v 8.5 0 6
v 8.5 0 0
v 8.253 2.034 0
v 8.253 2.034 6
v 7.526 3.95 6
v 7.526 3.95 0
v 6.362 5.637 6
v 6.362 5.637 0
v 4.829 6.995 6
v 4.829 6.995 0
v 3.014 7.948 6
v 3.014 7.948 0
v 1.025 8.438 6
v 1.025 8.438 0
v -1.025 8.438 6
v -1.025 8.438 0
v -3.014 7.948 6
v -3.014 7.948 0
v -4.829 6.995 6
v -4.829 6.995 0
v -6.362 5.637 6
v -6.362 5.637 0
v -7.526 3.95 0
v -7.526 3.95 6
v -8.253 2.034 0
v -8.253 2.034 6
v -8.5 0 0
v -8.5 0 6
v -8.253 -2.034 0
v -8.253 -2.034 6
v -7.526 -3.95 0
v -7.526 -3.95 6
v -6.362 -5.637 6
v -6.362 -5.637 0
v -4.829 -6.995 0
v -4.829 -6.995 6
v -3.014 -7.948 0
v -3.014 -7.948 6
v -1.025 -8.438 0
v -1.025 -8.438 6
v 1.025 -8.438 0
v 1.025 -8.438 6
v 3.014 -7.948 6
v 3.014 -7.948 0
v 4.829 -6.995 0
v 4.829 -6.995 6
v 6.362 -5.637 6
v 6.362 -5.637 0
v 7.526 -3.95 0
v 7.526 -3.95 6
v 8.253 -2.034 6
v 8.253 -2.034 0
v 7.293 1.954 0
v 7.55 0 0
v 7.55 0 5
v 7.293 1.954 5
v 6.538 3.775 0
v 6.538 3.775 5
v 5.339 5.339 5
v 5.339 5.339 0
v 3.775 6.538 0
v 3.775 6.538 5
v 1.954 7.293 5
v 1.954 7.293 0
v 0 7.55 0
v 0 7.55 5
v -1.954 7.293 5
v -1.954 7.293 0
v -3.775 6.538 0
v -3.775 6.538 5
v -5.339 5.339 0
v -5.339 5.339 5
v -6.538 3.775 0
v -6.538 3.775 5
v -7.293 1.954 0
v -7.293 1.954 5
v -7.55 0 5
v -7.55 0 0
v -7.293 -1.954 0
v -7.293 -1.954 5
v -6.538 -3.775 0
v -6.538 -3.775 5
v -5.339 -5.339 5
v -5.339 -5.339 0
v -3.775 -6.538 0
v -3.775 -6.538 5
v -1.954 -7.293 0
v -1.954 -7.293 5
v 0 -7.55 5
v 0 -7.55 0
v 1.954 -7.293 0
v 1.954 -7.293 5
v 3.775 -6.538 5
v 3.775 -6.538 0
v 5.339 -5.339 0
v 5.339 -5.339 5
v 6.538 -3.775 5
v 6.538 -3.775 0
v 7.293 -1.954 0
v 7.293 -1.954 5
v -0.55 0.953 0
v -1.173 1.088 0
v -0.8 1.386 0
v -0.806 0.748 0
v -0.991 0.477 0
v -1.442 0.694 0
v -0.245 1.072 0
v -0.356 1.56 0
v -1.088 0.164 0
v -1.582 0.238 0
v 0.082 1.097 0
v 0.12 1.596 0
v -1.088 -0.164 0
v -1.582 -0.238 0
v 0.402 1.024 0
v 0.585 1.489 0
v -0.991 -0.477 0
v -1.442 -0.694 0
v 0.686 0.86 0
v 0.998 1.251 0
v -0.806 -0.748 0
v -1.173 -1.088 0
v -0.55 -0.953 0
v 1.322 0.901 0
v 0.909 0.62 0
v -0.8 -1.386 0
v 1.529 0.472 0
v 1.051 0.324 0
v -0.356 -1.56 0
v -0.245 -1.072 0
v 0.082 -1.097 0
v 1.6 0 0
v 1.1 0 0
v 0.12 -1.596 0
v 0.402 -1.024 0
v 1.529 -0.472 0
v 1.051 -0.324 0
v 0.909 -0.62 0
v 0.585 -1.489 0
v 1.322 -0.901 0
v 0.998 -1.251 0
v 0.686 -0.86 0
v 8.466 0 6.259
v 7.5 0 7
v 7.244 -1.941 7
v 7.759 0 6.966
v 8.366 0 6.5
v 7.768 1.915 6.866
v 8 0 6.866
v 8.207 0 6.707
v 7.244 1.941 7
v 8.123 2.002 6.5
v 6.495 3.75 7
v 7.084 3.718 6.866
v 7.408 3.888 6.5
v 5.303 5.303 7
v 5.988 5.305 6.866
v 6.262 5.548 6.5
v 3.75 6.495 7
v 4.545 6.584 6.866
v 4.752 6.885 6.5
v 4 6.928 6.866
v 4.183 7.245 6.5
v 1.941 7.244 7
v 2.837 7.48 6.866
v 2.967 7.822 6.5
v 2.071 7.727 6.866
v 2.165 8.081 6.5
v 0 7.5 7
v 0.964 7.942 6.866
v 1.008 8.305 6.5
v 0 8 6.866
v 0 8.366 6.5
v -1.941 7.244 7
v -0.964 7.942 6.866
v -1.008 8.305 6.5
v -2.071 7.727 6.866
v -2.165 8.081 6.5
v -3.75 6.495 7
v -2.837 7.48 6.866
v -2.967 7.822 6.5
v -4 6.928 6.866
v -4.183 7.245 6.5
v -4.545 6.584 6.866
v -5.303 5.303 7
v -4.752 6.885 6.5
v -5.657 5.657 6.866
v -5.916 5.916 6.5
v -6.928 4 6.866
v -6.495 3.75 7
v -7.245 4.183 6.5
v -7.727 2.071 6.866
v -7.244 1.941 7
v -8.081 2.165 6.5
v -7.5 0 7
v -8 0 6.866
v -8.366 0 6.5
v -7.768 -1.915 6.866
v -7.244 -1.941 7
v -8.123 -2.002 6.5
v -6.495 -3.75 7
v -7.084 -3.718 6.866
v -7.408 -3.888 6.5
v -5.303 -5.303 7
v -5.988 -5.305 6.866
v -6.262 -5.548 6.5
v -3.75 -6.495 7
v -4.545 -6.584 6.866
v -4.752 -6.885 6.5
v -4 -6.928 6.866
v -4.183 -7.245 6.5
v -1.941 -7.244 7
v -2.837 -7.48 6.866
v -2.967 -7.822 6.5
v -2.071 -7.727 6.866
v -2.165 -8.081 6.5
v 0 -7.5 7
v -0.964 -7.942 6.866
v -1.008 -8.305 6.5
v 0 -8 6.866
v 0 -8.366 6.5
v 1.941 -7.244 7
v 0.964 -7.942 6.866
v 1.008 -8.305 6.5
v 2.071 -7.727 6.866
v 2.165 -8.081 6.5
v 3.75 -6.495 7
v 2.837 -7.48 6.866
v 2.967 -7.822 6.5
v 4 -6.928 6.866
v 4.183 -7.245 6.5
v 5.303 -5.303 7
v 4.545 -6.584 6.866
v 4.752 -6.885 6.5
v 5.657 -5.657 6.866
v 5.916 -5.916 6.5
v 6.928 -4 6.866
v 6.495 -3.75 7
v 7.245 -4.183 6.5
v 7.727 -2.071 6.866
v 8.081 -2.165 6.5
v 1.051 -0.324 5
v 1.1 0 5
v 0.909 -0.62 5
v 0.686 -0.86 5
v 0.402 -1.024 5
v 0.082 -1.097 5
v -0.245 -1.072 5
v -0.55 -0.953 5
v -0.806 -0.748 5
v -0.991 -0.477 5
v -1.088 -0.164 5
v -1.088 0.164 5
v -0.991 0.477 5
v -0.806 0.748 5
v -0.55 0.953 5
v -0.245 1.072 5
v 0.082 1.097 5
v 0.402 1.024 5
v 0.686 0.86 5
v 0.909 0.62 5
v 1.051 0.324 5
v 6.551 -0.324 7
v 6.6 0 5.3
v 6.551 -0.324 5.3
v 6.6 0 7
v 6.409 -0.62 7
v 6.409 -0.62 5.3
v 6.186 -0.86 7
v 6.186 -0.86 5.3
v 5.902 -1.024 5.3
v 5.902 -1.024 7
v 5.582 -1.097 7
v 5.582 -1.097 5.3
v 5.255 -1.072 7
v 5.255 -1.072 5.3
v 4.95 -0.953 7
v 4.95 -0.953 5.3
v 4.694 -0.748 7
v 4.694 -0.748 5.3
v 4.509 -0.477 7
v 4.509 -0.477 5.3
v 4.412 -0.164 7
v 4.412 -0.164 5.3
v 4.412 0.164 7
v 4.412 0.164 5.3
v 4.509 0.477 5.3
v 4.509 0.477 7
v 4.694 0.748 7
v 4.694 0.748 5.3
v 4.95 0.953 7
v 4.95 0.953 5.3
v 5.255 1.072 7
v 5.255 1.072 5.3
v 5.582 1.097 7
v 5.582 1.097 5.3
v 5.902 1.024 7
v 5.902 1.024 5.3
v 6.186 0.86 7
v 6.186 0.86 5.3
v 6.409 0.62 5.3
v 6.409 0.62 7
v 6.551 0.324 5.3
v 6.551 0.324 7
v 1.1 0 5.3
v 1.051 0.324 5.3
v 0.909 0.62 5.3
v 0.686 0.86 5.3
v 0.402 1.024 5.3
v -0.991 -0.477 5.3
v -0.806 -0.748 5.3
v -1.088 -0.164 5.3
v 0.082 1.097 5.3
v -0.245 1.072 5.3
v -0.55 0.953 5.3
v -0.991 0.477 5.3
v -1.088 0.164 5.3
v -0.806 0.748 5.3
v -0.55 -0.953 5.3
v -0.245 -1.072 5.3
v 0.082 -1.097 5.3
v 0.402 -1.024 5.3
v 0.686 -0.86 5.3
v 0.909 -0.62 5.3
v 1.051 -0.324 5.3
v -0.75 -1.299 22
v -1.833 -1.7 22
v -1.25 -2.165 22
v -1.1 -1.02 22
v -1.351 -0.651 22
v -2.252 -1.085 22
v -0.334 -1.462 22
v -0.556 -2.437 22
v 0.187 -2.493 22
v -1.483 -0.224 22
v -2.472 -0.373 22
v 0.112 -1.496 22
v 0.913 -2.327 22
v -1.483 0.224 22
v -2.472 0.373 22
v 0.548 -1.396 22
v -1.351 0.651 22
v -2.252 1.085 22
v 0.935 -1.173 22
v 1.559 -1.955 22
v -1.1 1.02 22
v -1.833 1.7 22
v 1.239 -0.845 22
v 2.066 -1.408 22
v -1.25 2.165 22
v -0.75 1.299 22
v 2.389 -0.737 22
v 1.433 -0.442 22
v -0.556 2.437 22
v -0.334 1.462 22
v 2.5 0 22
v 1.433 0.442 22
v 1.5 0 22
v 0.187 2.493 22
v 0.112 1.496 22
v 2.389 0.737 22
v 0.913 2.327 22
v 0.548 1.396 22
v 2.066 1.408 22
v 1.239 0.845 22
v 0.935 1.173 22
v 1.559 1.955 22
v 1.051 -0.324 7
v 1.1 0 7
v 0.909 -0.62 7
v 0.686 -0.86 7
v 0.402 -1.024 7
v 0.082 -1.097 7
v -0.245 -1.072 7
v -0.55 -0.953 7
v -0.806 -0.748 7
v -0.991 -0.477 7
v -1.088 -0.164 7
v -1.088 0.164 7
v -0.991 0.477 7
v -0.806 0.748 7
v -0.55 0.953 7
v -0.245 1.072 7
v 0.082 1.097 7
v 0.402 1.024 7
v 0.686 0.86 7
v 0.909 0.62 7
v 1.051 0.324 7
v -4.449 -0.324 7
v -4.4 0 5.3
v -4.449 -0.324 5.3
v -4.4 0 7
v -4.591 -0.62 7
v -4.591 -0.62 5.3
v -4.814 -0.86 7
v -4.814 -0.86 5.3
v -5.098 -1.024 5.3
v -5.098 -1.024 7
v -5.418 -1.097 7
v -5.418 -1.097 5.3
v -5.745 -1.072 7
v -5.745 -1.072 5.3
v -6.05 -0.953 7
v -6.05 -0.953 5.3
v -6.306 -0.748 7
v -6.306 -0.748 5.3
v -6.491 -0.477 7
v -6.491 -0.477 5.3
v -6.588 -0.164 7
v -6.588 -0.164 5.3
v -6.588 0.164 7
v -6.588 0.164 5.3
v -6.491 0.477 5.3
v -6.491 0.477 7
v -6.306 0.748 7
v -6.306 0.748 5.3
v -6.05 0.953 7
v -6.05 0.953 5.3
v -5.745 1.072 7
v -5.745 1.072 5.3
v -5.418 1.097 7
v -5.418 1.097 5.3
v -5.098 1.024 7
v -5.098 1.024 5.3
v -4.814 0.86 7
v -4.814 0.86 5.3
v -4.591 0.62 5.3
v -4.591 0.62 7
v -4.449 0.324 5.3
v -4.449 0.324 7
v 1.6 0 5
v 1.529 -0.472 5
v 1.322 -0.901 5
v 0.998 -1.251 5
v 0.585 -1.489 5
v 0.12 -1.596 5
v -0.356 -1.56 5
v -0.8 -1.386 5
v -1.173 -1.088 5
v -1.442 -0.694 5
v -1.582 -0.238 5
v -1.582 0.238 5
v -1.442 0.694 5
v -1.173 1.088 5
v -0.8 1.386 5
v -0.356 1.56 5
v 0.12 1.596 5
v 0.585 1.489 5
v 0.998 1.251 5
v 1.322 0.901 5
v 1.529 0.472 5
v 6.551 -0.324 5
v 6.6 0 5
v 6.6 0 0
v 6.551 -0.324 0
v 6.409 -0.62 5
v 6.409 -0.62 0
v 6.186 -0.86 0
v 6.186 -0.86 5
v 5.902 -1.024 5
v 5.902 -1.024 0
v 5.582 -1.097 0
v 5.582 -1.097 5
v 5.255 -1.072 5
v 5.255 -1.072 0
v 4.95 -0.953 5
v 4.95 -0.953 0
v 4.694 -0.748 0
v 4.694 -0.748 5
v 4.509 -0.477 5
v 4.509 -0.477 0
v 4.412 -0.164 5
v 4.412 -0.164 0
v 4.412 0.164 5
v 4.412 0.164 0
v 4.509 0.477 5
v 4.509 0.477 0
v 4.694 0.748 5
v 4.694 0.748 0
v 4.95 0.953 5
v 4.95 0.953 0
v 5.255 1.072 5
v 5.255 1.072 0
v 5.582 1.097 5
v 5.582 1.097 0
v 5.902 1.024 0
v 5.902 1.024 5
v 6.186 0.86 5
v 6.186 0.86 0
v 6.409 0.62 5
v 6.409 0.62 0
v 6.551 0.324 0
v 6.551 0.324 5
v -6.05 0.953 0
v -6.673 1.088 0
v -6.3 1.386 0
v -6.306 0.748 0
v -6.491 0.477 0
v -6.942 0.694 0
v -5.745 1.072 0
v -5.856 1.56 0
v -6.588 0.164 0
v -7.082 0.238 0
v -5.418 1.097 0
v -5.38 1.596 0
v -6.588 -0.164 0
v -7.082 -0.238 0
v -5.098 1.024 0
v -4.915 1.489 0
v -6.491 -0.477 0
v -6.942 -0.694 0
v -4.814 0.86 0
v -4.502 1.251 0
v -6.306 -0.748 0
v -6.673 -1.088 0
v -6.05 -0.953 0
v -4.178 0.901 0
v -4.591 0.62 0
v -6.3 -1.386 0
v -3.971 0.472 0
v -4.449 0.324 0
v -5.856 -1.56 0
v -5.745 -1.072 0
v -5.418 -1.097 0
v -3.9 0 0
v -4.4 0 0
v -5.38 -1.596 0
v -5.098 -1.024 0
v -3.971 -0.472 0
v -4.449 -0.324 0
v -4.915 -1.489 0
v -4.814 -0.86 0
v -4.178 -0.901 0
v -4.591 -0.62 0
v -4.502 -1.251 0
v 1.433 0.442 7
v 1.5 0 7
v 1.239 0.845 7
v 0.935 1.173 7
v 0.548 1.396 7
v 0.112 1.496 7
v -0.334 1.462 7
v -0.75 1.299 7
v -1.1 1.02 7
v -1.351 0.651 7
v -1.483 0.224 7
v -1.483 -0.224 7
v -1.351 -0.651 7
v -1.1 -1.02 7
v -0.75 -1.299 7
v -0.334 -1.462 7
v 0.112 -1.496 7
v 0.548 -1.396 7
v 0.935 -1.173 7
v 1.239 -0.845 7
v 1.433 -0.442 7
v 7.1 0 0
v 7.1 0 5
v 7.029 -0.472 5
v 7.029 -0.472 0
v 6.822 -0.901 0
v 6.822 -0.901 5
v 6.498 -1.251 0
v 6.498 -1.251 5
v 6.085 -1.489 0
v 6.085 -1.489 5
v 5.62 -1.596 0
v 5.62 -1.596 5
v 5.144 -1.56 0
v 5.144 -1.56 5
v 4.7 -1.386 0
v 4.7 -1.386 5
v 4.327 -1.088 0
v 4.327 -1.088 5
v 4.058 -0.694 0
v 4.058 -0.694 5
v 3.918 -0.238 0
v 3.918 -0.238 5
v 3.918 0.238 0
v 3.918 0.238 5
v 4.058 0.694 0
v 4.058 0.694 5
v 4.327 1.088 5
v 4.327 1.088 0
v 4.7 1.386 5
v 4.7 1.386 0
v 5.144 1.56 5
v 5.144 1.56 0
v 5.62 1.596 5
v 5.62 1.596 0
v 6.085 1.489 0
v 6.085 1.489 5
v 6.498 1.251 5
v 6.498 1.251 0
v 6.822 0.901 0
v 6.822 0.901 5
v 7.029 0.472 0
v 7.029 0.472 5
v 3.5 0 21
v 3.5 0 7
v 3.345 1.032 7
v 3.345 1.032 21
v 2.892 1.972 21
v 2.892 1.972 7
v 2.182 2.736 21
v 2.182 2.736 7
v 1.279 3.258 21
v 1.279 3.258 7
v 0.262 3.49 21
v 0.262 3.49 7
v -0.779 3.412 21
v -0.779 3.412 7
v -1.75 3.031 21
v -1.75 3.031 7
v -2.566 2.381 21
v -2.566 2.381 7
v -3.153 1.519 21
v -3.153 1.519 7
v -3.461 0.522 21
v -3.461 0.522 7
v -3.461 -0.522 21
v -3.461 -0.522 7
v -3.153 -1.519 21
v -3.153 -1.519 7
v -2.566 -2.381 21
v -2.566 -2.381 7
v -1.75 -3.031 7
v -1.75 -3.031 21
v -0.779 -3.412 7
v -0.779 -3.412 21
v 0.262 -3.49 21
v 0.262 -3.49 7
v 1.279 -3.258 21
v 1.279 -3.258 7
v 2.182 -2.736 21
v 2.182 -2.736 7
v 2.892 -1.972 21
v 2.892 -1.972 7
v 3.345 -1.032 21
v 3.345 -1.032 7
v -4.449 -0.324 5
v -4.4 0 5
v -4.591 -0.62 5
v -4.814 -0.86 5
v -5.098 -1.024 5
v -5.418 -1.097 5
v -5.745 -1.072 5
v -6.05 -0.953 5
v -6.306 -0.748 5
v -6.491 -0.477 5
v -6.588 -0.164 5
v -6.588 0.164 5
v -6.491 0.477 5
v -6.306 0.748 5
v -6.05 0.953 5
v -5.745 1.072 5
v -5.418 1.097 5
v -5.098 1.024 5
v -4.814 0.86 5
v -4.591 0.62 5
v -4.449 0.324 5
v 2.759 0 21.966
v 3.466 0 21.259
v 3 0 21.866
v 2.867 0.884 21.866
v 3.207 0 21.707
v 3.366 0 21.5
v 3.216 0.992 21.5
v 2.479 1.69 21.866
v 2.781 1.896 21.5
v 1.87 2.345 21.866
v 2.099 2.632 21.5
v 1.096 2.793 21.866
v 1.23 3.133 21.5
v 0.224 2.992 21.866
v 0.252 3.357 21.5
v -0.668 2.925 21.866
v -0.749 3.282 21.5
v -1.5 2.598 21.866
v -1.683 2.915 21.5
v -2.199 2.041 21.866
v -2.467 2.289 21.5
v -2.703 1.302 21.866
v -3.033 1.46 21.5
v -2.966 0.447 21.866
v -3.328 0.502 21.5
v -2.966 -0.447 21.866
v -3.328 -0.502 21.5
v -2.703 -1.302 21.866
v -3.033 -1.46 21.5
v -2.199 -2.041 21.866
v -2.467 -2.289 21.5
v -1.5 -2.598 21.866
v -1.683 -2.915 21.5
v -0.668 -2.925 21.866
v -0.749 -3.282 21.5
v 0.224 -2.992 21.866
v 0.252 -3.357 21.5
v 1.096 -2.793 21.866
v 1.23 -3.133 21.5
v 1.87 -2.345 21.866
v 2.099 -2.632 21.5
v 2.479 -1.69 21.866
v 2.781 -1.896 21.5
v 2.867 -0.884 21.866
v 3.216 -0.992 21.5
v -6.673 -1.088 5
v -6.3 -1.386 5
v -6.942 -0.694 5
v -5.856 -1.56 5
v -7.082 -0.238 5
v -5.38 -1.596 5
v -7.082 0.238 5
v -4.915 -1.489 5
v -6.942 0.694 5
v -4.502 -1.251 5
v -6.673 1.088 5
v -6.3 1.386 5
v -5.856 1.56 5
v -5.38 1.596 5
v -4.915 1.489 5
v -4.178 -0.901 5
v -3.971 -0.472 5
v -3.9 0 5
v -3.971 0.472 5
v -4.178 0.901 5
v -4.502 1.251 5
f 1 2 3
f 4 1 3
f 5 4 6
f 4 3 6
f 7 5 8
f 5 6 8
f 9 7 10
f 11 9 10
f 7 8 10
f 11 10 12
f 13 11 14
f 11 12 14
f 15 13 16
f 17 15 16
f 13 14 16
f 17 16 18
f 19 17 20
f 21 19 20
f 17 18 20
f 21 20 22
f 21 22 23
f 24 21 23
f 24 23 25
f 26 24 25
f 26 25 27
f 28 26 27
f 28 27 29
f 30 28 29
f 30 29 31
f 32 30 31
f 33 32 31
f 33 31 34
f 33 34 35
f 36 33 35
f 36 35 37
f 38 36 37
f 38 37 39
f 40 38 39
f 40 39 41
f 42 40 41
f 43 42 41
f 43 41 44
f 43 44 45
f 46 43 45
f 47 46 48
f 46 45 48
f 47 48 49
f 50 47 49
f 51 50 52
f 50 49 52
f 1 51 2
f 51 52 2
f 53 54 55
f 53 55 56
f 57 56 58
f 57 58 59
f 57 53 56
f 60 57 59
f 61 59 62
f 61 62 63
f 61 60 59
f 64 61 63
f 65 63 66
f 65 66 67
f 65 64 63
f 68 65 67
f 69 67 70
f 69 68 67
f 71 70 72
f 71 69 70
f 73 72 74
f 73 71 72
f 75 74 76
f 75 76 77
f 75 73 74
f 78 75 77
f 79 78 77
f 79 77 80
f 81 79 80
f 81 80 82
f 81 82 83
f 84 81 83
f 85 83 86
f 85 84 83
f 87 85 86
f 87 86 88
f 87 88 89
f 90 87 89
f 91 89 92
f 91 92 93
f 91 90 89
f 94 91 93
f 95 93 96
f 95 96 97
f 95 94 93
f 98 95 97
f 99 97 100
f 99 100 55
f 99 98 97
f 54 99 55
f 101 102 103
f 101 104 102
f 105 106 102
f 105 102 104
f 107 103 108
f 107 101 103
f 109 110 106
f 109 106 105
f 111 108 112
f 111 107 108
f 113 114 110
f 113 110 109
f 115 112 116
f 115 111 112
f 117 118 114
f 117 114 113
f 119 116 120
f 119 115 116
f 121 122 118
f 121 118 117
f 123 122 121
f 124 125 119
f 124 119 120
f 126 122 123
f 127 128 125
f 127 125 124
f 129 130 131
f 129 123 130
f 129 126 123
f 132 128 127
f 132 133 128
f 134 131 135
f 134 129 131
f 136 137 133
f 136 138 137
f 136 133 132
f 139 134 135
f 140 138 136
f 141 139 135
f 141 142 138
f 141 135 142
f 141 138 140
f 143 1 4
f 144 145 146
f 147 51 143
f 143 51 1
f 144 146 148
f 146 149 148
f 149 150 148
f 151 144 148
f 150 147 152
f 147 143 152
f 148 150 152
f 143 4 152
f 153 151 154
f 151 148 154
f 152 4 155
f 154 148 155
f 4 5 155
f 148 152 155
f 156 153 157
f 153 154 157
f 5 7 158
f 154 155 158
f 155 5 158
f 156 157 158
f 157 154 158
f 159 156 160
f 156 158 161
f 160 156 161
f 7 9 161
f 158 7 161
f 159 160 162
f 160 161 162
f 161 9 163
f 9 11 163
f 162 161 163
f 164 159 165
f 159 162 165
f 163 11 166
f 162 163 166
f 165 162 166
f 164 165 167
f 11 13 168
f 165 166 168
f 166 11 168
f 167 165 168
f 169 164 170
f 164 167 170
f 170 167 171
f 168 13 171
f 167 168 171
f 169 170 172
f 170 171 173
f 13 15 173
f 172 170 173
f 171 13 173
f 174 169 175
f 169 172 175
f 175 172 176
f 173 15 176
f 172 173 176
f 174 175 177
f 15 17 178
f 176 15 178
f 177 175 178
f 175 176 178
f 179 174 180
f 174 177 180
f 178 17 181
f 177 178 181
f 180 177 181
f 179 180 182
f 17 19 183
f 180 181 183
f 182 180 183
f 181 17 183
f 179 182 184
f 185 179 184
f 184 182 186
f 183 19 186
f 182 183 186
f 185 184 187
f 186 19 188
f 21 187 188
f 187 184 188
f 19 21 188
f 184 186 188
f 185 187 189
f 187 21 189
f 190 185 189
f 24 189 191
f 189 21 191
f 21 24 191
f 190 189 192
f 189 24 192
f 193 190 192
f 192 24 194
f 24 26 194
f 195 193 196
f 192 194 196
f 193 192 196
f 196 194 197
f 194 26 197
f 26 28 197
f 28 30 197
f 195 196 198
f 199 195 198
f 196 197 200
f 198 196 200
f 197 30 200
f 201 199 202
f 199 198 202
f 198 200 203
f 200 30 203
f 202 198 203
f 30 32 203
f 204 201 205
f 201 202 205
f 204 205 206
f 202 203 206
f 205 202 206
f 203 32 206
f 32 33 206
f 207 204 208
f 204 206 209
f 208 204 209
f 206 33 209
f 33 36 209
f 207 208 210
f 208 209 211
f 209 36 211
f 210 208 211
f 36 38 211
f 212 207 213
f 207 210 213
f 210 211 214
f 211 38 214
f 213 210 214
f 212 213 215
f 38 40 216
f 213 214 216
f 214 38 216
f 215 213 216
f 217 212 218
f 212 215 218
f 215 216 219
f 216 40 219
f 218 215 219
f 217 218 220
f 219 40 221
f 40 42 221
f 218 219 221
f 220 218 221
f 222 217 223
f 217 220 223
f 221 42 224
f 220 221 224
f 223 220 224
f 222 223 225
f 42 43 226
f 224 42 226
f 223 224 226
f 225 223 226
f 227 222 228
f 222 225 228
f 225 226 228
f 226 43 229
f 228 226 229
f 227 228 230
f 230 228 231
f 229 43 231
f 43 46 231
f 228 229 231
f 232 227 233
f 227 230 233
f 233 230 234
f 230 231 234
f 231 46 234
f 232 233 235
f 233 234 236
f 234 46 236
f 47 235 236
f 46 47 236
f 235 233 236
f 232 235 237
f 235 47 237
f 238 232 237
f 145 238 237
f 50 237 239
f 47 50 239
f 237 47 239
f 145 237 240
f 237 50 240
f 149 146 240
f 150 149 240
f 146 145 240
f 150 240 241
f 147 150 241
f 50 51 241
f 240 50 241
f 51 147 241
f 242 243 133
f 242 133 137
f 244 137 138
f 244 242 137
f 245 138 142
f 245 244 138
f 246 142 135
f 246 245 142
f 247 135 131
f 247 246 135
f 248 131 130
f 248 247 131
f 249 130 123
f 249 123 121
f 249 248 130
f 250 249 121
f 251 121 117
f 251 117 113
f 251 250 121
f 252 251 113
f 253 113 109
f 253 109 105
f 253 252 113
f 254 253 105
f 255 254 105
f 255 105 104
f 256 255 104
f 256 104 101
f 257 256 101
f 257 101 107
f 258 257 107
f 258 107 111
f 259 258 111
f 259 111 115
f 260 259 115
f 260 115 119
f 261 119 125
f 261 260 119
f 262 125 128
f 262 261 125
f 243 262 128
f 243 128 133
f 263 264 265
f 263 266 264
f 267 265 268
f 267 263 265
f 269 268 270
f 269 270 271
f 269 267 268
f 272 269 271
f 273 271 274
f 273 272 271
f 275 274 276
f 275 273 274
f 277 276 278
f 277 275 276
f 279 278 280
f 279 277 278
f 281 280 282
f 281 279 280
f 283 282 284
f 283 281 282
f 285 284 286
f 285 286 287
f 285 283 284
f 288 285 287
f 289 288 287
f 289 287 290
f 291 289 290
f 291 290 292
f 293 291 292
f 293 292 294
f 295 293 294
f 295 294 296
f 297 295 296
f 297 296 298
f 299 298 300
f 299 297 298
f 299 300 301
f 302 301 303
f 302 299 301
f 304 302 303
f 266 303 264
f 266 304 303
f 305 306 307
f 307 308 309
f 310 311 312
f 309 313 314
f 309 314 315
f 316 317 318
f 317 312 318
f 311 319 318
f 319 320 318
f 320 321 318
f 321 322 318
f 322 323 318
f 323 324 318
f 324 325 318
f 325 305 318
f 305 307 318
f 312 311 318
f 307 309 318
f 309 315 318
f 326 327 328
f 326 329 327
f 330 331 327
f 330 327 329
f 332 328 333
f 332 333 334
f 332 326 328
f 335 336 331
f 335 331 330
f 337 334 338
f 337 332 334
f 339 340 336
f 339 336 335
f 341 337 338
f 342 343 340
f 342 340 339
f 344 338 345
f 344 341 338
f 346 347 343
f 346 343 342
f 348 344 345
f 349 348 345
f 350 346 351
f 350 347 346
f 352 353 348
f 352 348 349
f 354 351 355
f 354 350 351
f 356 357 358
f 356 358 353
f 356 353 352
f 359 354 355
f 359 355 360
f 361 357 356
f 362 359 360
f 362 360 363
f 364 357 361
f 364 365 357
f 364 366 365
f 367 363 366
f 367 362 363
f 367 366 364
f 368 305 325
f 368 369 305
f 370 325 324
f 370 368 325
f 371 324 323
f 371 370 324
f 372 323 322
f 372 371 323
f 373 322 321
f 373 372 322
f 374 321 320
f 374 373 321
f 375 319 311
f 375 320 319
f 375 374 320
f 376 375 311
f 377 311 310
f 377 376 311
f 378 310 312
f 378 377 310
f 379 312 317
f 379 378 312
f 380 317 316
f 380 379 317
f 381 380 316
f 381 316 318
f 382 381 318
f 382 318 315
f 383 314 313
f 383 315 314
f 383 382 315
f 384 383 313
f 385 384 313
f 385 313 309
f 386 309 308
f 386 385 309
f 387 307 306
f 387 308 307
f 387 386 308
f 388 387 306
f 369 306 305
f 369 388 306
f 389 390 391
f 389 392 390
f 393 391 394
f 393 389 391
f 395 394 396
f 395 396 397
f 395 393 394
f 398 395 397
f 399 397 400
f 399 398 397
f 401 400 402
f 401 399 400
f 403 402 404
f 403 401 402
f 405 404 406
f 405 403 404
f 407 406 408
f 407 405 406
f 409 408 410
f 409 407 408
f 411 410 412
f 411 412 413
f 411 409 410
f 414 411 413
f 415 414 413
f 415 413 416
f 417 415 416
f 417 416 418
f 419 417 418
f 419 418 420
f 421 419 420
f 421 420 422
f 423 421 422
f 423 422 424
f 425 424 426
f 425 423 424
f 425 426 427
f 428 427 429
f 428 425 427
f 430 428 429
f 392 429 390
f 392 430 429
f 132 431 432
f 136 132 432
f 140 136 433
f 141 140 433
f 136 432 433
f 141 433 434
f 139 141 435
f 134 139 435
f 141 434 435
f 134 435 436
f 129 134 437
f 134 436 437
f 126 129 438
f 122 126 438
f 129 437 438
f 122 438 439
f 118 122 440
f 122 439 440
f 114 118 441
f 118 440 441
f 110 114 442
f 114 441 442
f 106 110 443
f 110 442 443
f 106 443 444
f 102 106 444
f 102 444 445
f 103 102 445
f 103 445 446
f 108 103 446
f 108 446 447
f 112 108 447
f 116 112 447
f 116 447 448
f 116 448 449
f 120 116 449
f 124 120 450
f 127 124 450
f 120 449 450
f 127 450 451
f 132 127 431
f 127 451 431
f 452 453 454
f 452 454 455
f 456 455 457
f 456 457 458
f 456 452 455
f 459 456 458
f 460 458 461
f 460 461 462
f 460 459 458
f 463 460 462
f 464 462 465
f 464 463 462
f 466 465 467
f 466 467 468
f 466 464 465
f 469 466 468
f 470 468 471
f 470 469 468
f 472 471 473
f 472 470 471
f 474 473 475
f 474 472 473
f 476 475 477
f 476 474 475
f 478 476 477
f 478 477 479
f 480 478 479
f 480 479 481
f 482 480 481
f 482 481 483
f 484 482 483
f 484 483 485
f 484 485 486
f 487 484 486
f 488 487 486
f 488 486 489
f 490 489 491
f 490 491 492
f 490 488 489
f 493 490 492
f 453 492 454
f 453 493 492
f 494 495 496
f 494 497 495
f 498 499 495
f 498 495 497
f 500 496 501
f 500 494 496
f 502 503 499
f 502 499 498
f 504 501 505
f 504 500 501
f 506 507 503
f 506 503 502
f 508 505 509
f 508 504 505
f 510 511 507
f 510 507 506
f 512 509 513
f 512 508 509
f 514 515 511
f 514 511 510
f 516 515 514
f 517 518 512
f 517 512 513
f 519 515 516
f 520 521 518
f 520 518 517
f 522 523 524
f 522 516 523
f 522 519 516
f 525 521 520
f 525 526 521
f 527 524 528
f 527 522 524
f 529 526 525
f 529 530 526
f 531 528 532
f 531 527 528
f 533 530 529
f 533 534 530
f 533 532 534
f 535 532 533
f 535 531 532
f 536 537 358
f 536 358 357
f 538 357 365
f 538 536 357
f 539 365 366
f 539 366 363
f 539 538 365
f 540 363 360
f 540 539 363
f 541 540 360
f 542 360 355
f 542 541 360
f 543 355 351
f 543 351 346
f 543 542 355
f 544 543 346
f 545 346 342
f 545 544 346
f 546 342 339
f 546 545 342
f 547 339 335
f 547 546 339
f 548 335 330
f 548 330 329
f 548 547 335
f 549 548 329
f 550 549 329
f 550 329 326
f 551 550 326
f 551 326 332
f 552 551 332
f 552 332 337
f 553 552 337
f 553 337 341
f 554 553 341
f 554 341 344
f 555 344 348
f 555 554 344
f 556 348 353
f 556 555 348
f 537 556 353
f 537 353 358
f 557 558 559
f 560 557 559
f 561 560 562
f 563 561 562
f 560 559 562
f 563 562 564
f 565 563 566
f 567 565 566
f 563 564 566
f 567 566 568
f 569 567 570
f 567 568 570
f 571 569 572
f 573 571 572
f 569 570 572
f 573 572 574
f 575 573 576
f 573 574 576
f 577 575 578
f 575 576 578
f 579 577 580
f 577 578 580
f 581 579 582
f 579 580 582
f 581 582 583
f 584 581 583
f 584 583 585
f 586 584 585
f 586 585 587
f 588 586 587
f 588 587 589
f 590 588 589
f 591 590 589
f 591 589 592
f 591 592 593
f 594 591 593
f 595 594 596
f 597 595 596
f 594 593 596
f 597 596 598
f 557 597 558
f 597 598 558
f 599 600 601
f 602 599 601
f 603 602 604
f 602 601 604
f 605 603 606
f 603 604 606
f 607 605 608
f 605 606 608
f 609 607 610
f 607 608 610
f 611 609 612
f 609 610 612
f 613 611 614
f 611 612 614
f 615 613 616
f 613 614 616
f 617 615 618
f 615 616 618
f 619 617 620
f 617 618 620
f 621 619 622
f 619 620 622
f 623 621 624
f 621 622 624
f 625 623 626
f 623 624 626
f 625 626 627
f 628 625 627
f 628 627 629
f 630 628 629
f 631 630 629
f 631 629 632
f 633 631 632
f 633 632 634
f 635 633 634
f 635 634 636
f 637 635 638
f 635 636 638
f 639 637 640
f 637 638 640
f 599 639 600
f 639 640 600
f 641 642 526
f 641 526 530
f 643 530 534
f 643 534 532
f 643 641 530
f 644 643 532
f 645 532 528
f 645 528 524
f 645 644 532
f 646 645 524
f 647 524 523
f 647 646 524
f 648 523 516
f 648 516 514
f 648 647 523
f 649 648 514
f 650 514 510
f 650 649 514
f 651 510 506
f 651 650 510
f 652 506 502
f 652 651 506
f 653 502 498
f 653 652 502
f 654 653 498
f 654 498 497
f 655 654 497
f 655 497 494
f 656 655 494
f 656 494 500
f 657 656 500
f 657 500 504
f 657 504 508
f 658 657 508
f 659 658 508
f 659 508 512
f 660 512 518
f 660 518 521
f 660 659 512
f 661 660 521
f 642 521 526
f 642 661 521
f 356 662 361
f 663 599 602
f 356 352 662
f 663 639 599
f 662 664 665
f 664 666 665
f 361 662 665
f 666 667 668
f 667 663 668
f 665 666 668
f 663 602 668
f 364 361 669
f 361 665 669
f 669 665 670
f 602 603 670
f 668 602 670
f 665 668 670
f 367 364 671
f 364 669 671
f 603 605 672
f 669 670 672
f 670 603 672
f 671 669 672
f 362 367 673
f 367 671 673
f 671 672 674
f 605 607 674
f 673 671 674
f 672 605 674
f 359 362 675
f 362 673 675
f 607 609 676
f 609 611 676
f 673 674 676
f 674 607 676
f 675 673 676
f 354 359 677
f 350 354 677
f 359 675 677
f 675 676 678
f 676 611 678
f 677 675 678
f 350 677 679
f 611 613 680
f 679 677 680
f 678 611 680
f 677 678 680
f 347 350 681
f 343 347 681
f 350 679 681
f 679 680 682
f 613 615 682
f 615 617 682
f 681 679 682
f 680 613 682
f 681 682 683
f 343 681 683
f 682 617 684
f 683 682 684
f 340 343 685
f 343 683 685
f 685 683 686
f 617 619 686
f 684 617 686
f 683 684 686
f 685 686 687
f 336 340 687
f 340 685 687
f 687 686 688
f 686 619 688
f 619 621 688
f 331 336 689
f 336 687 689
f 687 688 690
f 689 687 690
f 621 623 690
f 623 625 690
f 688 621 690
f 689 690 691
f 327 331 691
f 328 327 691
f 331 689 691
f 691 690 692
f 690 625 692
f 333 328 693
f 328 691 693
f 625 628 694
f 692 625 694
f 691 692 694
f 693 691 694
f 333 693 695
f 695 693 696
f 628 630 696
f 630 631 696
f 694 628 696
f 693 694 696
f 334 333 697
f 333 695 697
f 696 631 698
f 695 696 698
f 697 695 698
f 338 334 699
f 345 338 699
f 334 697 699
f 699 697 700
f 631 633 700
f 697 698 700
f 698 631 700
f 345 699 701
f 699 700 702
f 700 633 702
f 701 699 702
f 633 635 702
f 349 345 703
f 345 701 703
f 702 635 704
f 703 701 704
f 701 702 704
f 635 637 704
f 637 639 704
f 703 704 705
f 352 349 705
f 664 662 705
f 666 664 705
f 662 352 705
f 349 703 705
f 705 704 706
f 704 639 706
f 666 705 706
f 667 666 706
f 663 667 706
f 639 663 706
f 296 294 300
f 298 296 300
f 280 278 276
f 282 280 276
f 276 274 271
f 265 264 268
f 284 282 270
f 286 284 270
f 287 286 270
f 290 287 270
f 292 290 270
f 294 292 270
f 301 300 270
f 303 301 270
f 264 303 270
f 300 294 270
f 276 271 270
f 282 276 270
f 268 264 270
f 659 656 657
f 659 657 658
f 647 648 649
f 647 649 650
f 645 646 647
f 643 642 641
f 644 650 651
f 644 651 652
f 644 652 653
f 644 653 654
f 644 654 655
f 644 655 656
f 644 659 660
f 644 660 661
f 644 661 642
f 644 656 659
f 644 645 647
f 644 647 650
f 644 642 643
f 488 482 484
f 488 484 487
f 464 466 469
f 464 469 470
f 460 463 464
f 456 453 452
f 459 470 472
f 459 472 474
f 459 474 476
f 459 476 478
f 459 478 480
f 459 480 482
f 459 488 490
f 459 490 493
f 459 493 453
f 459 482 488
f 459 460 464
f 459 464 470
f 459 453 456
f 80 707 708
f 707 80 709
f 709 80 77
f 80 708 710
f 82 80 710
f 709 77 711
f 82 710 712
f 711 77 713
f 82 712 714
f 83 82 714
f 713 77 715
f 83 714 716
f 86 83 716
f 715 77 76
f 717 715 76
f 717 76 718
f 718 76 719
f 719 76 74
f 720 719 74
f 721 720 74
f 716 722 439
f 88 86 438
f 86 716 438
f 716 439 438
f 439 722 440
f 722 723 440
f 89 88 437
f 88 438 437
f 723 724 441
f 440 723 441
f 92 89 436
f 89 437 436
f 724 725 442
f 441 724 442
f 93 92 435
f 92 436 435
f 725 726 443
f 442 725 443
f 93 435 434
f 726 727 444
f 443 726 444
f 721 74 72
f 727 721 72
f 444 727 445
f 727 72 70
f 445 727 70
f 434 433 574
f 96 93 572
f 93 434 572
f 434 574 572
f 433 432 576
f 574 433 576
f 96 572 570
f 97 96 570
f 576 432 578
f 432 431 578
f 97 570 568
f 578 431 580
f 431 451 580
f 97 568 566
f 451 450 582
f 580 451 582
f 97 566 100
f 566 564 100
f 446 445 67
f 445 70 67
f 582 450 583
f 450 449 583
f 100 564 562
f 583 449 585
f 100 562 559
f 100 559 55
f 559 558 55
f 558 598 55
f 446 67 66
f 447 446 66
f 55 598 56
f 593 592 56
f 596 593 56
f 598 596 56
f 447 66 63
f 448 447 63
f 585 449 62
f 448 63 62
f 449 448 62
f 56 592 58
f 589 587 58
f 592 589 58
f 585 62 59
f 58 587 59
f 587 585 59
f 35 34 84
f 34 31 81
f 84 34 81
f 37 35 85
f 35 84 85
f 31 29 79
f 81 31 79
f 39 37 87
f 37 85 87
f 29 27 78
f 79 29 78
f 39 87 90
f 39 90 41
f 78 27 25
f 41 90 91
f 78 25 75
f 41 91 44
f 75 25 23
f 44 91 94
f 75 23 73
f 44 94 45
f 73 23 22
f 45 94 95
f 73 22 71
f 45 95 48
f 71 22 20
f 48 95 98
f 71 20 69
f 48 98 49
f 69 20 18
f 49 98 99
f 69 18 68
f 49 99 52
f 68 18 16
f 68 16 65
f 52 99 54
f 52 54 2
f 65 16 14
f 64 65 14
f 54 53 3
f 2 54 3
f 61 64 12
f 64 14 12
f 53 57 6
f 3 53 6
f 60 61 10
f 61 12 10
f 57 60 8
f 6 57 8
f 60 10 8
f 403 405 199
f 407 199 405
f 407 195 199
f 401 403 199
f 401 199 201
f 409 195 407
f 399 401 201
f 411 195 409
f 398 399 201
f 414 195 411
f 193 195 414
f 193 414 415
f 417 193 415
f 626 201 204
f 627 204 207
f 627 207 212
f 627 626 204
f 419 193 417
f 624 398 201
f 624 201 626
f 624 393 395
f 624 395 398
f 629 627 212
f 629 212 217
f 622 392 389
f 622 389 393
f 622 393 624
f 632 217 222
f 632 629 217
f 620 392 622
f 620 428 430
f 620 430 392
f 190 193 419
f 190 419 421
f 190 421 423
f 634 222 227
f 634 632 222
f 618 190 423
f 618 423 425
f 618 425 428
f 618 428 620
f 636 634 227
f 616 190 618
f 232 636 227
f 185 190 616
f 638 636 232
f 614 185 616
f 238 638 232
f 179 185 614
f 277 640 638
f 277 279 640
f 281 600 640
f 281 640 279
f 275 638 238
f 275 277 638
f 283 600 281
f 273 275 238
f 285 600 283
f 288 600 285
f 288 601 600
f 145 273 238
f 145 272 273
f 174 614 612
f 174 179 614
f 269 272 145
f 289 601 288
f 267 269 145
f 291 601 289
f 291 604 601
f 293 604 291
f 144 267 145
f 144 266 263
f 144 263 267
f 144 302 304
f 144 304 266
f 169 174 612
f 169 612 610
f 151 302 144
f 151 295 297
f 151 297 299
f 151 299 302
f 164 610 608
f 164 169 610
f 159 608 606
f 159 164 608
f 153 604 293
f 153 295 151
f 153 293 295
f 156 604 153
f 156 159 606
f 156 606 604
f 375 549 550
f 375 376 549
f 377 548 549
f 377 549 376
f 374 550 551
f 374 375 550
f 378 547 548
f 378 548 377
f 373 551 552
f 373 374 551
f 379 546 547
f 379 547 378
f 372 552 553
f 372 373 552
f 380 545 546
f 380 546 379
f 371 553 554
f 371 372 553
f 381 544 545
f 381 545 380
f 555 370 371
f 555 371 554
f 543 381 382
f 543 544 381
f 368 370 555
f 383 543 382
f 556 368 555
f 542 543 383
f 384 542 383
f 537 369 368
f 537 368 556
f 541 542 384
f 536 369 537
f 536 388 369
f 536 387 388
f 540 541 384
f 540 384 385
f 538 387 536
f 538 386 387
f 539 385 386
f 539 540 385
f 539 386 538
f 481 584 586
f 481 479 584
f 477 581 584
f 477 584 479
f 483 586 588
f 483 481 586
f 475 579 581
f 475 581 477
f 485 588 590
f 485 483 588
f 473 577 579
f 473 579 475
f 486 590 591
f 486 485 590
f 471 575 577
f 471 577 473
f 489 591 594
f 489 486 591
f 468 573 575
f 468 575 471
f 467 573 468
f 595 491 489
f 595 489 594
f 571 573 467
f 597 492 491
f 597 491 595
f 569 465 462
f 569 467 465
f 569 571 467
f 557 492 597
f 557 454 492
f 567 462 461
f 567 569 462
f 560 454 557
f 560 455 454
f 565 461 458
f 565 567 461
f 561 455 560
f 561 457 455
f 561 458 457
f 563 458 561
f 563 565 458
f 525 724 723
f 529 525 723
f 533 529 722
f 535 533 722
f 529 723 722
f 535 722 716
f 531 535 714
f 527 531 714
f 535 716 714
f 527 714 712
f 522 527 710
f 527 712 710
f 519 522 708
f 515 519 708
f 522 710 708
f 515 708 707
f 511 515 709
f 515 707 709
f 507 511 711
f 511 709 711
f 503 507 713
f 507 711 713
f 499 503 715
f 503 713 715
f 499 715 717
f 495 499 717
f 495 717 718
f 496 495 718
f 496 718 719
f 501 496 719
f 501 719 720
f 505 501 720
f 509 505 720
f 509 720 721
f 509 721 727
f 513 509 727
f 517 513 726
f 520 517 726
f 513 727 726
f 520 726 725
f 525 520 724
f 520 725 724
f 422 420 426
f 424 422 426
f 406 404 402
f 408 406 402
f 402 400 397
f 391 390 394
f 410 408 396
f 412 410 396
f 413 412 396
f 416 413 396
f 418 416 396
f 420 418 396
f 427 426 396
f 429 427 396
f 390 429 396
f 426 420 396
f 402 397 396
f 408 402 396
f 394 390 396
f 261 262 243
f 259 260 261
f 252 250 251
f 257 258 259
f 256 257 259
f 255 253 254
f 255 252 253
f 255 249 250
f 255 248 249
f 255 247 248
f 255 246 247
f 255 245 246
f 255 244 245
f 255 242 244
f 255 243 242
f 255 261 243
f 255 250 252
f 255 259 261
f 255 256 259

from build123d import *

# Parameters (mm, degrees)
SKETCH1_R               = 8.5
SKETCH1_R_2             = 7.55
BOSS_EXTRUDE1_DEPTH     = 5
SKETCH2_R               = 8.5
SKETCH2_R_2             = 1.1
BOSS_EXTRUDE2_DEPTH     = 2
SKETCH3_R               = 3.5
SKETCH3_R_2             = 1.5
BOSS_EXTRUDE3_DEPTH     = 15
CUT_EXTRUDE1_DEPTH      = 20.222382787
CUT_EXTRUDE1_DEPTH_BACK = 20.222382787
SKETCH3_3_R             = 1.1
SKETCH4_R               = 1.6
SKETCH4_R_2             = 1.1
BOSS_EXTRUDE4_DEPTH     = 5
BOSS_EXTRUDE5_START     = -0.3
SKETCH5_R               = 1.1
BOSS_EXTRUDE5_DEPTH     = 0.3
FILLET1_R               = 1


with BuildPart() as part:
    # Sketch1 → Boss-Extrude1 (new body)
    with BuildSketch(Plane.XY):
        Circle(SKETCH1_R)
        Circle(SKETCH1_R_2, mode=Mode.SUBTRACT)
    extrude(amount=BOSS_EXTRUDE1_DEPTH)

    # Sketch2 → Boss-Extrude2 (add)
    with BuildSketch(Plane.XY.offset(5)):
        Circle(SKETCH2_R)
        Circle(SKETCH2_R_2, mode=Mode.SUBTRACT)
    extrude(amount=BOSS_EXTRUDE2_DEPTH)

    # Sketch3 → Boss-Extrude3 (add)
    with BuildSketch(Plane.XY.offset(7)):
        Circle(SKETCH3_R)
        Circle(SKETCH3_R_2, mode=Mode.SUBTRACT)
    extrude(amount=BOSS_EXTRUDE3_DEPTH)

    # Sketch3<3> → Cut-Extrude1 (cut, two sides: drawn at the far end of the back side and taken through both)
    with BuildSketch(Plane.XY.offset(7).offset(-CUT_EXTRUDE1_DEPTH_BACK)):
        with Locations((-5.5, 0)):
            Circle(SKETCH3_3_R)
        with Locations((5.5, 0)):
            Circle(SKETCH3_3_R)
    extrude(amount=CUT_EXTRUDE1_DEPTH + CUT_EXTRUDE1_DEPTH_BACK, mode=Mode.SUBTRACT)

    # Sketch4 → Boss-Extrude4 (add)
    # profile 1 of 3: a face of its own
    with BuildSketch(Plane(origin=(0, 0, 5), x_dir=(-1, 0, 0), z_dir=(0, 0, -1))):
        with Locations(Location((5.5, 0, 0), (0, 0, 180))):
            Circle(SKETCH4_R)
        with Locations(Location((5.5, 0, 0), (0, 0, 180))):
            Circle(SKETCH4_R_2, mode=Mode.SUBTRACT)
    # profile 2 of 3: a face of its own
    with BuildSketch(Plane(origin=(0, 0, 5), x_dir=(-1, 0, 0), z_dir=(0, 0, -1))):
        with Locations(Location((0, 0, 0), (0, 0, 180))):
            Circle(SKETCH4_R)
        with Locations(Location((0, 0, 0), (0, 0, 180))):
            Circle(SKETCH4_R_2, mode=Mode.SUBTRACT)
    # profile 3 of 3: a face of its own
    with BuildSketch(Plane(origin=(0, 0, 5), x_dir=(-1, 0, 0), z_dir=(0, 0, -1))):
        with Locations(Location((-5.5, 0, 0), (0, 0, 180))):
            Circle(SKETCH4_R)
        with Locations(Location((-5.5, 0, 0), (0, 0, 180))):
            Circle(SKETCH4_R_2, mode=Mode.SUBTRACT)
    extrude(amount=BOSS_EXTRUDE4_DEPTH)

    # Sketch5 → Boss-Extrude5 (add)
    with BuildSketch(Plane(origin=(0, 0, 5), x_dir=(-1, 0, 0), z_dir=(0, 0, -1)).offset(BOSS_EXTRUDE5_START)):
        with Locations(Location((5.5, 0, 0), (0, 0, 180))):
            Circle(SKETCH5_R)
        with Locations(Location((-5.5, 0, 0), (0, 0, 180))):
            Circle(SKETCH5_R)
        Circle(SKETCH5_R)
    extrude(amount=BOSS_EXTRUDE5_DEPTH)

    # Fillet1
    fillet1_edges = [part.edges().sort_by_distance(p)[0] for p in [
        (-8.5, 0, 7),
        (-3.5, 0, 22),
    ]]
    fillet(fillet1_edges, radius=FILLET1_R)


solid = part.part
